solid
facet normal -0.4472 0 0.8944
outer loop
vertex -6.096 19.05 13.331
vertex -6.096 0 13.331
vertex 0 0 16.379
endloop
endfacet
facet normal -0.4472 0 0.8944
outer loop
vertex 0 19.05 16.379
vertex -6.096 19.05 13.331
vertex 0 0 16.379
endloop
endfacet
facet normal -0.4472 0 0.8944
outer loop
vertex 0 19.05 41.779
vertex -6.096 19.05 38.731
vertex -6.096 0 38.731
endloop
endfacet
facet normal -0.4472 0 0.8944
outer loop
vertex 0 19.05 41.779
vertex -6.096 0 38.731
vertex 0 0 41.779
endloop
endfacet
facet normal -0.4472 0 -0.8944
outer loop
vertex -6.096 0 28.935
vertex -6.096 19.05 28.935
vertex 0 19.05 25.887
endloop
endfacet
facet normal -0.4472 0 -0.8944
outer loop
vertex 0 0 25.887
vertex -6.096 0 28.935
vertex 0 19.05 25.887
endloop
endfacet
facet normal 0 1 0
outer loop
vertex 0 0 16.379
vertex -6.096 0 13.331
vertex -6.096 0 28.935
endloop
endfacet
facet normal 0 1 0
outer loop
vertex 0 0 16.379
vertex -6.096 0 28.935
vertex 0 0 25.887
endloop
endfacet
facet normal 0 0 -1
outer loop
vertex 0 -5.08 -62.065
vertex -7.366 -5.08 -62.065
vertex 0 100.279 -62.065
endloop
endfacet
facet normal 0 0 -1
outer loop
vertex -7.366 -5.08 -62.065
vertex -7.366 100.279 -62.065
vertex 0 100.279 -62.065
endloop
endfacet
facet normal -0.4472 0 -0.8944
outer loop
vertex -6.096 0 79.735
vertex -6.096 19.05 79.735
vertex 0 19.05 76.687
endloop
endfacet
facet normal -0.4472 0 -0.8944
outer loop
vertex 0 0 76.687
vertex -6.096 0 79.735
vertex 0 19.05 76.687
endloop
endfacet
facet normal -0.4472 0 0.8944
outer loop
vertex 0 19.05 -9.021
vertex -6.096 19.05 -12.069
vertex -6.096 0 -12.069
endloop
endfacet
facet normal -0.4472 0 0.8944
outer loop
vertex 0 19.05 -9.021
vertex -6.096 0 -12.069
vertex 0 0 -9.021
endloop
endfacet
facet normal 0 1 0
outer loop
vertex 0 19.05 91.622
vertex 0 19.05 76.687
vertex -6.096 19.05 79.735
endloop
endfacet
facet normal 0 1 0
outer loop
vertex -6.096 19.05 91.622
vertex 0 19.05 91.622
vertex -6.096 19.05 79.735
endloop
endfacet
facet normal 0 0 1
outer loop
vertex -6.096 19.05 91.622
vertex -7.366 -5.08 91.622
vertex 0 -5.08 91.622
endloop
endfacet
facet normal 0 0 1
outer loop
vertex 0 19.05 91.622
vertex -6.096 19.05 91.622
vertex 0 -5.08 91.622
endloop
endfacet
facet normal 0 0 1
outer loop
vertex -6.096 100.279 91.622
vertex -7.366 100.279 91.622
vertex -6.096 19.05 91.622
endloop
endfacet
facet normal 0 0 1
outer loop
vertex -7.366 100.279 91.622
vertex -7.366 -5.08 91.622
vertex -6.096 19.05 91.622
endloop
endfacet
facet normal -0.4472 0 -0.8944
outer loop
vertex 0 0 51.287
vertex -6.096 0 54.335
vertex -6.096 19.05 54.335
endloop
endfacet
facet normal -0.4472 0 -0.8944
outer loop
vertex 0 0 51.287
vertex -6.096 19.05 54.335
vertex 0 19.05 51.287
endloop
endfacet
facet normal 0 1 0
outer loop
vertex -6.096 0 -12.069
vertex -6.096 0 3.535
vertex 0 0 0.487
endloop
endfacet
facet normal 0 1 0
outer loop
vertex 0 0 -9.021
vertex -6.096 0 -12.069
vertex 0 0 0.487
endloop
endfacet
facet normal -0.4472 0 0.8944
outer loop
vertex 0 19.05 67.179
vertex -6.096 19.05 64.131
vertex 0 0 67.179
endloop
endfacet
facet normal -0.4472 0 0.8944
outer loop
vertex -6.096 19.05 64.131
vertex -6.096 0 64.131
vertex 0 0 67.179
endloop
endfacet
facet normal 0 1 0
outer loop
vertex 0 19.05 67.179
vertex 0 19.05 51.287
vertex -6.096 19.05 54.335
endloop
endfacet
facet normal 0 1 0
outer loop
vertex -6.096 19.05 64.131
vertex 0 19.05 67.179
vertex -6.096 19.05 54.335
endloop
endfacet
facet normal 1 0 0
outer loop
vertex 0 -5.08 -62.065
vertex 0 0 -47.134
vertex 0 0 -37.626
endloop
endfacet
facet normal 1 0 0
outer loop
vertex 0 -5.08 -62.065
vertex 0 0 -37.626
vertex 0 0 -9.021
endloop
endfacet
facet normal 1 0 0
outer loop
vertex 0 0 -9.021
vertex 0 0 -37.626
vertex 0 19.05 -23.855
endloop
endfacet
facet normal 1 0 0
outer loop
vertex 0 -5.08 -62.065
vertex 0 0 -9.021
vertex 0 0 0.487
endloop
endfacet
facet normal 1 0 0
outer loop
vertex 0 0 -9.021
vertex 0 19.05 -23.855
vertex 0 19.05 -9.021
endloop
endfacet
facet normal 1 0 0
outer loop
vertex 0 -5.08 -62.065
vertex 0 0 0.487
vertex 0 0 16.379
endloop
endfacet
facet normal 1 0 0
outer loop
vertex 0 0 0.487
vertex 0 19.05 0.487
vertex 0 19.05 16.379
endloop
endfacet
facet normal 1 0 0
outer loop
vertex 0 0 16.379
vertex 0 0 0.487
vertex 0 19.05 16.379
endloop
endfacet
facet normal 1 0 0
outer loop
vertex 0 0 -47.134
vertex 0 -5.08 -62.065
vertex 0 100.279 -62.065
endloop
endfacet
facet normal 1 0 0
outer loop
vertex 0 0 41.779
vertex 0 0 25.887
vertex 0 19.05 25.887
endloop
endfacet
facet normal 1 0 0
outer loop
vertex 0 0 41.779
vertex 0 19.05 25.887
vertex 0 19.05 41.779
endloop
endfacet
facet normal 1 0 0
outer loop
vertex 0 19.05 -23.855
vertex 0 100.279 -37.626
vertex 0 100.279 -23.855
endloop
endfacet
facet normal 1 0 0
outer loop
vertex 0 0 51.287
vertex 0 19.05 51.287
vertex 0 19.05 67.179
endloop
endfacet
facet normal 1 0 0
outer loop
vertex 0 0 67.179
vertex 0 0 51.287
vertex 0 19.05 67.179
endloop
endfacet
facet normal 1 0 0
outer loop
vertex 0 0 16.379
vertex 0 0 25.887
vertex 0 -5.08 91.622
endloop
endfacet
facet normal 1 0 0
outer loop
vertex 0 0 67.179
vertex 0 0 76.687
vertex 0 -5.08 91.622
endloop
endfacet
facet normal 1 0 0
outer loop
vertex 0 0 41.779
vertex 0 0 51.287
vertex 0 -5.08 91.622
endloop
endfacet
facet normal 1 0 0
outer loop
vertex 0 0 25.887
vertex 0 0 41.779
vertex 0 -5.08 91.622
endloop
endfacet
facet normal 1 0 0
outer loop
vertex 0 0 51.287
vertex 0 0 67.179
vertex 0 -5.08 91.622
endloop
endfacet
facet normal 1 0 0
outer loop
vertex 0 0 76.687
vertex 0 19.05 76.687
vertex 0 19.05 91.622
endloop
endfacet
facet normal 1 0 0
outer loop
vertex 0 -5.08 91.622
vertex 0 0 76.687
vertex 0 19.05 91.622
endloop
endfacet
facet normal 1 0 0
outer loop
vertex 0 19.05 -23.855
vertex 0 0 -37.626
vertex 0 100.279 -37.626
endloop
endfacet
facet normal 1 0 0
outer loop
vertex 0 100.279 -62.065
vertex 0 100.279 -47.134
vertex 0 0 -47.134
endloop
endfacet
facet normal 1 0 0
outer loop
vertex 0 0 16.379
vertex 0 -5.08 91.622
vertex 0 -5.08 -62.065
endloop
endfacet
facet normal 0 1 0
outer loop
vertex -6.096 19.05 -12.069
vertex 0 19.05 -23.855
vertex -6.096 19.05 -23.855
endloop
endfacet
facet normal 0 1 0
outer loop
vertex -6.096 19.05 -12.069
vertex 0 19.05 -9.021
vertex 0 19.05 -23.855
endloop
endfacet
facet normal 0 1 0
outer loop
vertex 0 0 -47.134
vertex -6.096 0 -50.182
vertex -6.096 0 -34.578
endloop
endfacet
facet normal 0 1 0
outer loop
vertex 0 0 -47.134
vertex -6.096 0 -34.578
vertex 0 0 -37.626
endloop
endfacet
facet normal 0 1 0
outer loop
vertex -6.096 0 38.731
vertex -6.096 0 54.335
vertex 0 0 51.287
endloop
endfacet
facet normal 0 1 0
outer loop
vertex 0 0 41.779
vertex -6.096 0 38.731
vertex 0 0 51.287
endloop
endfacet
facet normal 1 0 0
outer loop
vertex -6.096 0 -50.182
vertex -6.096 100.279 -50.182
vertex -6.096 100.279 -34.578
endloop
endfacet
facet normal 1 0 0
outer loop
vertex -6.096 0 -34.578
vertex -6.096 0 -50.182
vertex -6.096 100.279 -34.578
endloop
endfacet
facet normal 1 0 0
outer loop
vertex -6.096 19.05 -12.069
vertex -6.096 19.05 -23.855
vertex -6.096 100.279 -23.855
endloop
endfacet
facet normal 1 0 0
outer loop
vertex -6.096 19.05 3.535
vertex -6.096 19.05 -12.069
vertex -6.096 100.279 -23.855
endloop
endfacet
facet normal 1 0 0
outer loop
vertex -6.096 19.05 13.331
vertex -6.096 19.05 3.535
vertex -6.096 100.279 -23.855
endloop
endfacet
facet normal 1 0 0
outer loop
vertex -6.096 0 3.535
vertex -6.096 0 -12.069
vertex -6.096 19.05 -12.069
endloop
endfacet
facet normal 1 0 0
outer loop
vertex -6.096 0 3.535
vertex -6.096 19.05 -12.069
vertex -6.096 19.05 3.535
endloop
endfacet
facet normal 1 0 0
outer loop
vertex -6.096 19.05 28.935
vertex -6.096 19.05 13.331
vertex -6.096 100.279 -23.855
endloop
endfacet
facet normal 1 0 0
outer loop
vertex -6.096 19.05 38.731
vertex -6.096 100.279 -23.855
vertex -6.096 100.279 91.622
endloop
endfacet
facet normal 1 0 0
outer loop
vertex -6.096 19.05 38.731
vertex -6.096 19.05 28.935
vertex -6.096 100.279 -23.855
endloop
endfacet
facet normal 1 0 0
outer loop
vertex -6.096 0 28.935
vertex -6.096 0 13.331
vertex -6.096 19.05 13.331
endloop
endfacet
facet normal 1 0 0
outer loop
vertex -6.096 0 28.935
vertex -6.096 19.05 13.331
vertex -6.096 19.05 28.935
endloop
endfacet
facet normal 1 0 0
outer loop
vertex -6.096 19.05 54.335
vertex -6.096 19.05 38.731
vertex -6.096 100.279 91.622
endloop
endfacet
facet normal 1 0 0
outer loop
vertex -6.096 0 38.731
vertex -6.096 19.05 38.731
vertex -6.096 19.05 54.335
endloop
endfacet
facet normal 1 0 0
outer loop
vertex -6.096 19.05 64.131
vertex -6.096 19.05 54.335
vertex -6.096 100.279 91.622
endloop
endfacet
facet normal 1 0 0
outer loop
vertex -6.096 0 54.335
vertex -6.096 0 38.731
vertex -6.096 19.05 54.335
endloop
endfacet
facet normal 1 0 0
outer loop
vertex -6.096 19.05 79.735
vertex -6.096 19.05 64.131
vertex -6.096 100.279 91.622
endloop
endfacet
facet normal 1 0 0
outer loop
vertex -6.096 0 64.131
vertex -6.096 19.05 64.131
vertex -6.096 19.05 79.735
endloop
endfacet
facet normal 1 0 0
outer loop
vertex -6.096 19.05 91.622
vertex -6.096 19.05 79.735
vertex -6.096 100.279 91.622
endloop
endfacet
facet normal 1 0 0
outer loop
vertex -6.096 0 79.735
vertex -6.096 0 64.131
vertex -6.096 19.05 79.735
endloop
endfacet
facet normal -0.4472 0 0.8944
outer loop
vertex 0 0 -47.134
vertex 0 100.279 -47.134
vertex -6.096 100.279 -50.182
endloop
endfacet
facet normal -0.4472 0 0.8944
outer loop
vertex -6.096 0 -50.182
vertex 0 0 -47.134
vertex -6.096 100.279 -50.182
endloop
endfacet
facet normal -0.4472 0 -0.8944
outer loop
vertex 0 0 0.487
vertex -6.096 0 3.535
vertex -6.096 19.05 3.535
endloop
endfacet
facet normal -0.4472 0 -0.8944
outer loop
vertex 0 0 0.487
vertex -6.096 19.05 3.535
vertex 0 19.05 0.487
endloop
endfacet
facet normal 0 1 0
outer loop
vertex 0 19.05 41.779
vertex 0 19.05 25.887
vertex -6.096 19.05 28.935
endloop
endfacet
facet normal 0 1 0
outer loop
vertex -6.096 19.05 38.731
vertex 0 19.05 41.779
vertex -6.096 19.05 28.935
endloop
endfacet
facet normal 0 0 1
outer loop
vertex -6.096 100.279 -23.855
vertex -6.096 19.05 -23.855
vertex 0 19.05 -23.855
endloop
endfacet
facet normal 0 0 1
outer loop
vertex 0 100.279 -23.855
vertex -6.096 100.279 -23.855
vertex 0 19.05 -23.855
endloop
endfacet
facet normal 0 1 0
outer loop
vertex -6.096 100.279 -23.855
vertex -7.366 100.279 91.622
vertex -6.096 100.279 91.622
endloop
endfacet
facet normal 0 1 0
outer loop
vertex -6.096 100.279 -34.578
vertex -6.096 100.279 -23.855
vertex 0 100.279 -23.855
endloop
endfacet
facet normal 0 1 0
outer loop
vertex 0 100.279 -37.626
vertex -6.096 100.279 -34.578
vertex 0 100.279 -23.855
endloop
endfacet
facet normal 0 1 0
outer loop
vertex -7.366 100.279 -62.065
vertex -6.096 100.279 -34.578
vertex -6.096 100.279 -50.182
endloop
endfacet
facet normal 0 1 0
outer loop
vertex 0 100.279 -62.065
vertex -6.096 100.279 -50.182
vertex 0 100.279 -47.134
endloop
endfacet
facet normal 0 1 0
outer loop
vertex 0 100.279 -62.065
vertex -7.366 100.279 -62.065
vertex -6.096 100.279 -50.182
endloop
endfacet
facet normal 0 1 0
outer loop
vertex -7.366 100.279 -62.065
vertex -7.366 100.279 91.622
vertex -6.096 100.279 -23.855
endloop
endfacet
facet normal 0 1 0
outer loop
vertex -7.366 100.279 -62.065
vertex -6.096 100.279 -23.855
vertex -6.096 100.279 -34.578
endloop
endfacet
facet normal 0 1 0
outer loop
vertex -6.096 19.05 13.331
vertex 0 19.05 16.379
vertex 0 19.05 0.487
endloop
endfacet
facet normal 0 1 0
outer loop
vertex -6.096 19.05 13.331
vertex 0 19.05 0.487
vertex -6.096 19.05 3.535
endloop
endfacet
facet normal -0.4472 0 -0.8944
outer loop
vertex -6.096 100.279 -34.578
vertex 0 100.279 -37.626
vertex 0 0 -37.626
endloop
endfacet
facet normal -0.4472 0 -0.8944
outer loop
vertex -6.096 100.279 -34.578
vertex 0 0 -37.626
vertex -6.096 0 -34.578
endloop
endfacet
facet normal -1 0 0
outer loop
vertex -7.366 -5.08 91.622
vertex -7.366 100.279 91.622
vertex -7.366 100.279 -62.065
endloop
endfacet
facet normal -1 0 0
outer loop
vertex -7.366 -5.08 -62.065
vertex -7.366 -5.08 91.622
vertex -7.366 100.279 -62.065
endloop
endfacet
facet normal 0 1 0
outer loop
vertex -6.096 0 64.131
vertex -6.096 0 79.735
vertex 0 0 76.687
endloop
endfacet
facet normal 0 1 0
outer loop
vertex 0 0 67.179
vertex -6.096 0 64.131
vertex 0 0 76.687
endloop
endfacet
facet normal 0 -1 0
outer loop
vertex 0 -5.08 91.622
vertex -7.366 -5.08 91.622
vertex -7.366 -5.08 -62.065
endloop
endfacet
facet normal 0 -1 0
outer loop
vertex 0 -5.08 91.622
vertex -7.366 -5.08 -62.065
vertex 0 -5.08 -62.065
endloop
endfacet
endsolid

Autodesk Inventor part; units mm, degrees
ref_plane "YZ Plane" through (0, 0, 0) normal (1, 0, 0) x (0, 1, 0)
ref_plane "XZ Plane" through (0, 0, 0) normal (0, 1, 0) x (-1, 0, 0)
ref_plane "XY Plane" through (0, 0, 0) normal (0, 0, 1) x (1, 0, 0)
sketch "Sketch1" plane through (0, 0, 0) normal (0, 1, 0) x (-1, 0, 0)
  line L0 (7.366, 6.1452) -> (7.366, -23.8548)
  line L1 (7.366, -23.8548) -> (0, -23.8548)
  line L2 (6.096, -8.0476) -> (6.096, -9.0212)
  line L3 (0, 0.4868) -> (0, 3.5348)
  line L4 (6.096, 3.5348) -> (6.096, -8.0476)
  line L5 (0, -9.0212) -> (0, -11.8152)
  line L6 (6.096, -12.0692) -> (6.096, -9.0212)
  line L7 (6.096, 3.5348) -> (0, 0.4868)
  line L8 (6.096, -12.0692) -> (0, -9.0212)
  line L9 (0, -23.8548) -> (0, -9.0212)
  line L10 (0, 0.4868) -> (0, 16.3788)
  line L11 (6.096, 13.3308) -> (6.096, 16.3788)
  line L12 (6.096, 13.3308) -> (0, 16.3788)
  line L13 (6.096, 28.9348) -> (6.096, 17.3524)
  line L14 (6.096, 28.9348) -> (0, 25.8868)
  line L15 (6.096, 17.3524) -> (6.096, 16.3788)
  line L16 (6.096, 38.7308) -> (6.096, 41.7788)
  line L17 (6.096, 38.7308) -> (0, 41.7788)
  line L18 (6.096, 54.3348) -> (6.096, 42.7524)
  line L19 (6.096, 54.3348) -> (0, 51.2868)
  line L20 (6.096, 42.7524) -> (6.096, 41.7788)
  line L21 (6.096, 64.1308) -> (6.096, 67.1788)
  line L22 (6.096, 64.1308) -> (0, 67.1788)
  line L23 (6.096, 79.7348) -> (6.096, 68.1524)
  line L24 (6.096, 79.7348) -> (0, 76.6868)
  line L25 (6.096, 68.1524) -> (6.096, 67.1788)
  line L26 (7.366, 6.1452) -> (7.366, 91.622)
  line L27 (7.366, 91.622) -> (0, 91.622)
  line L28 (0, 25.8868) -> (0, 41.7788)
  line L29 (0, 51.2868) -> (0, 67.1788)
  line L30 (0, 76.6868) -> (0, 91.622)
  line L31 (6.096, -4.2672) -> (4.0009, -4.2672) construction
  point P0 (0, 0)
  dimension "d0" = 7.366
  dimension "d8" = 9.508
  dimension "d10" = 3.048
  dimension "d11" = 3.048
  dimension "d12" = 6.096
  dimension "d17" = 25.4
  dimension "d24" = 11.7856
  dimension "d67" = 115.4768
  dimension "d70" = 23.8548
  dimension "d71" = 4.754
extrude "MultipleTeeth" add sketch "Sketch1" along normal blind 19.05
sketch "Sketch2" plane through (0, 0, 0) normal (0, -1, 0) x (1, 0, 0)
  line L0 (0, 0.4868) -> (-6.096, 3.5348) construction
  line L1 (-6.096, 3.5348) -> (-6.096, -12.0692) construction
  line L2 (-6.096, -12.0692) -> (0, -9.0212) construction
  line L3 (0, 16.3788) -> (0, 0.4868) projected
  line L4 (0, 0.4868) -> (-6.096, 3.5348)
  line L5 (-6.096, -12.0692) -> (0, -9.0212) projected
  line L6 (-6.096, 3.5348) -> (-6.096, -12.0692) projected
  line L7 (-6.096, -12.0692) -> (-6.096, 3.5348)
  line L8 (0, -9.0212) -> (-6.096, -12.0692)
  line L9 (-7.366, -23.8548) -> (-7.366, 91.622) projected
  line L10 (-7.366, -59.508) -> (-7.366, -32.8548)
  line L11 (-7.366, -23.8548) -> (0, -23.8548)
  line L12 (-7.366, 91.622) -> (0, 91.622) projected
  line L13 (-7.366, -55.8503) -> (-7.366, -40.458) construction
  line L14 (0, -43.0234) -> (0, -59.508) construction
  line L15 (-6.096, -62.0648) -> (0, -62.0648) construction
  line L16 (0, -32.8548) -> (0, -37.6258)
  line L17 (0, -49.9828) -> (0, -62.0648)
  line L18 (0, -62.0648) -> (0, -59.508)
  line L19 (0, -32.8548) -> (-7.366, -32.8548) construction
  line L20 (0, -51.9048) -> (-7.366, -51.9048) construction
  line L21 (0, -42.3798) -> (-7.366, -42.3798) construction
  line L22 (-6.096, -12.0692) -> (-6.096, -62.0648) construction
  line L23 (0, -37.6258) -> (-6.096, -34.5778)
  line L24 (-6.096, -50.1818) -> (-6.096, -34.5778)
  line L25 (0, -47.1338) -> (-6.096, -50.1818)
  line L26 (0, -9.0212) -> (0, -23.8548) projected
  line L27 (0, -23.8548) -> (0, -32.8548)
  line L28 (-7.366, -32.8548) -> (-7.366, -23.8548)
  line L29 (0, -49.9828) -> (0, -47.1338)
  line L30 (0, -62.0648) -> (-7.366, -62.0648)
  line L31 (-7.366, -62.0648) -> (-7.366, -59.508)
  point P0 (0, 0)
  dimension "d25" = 115.4768
  dimension "d33" = 9
  dimension "d34" = 19.05
  dimension "d36" = 9.525
  dimension "d38" = 10.16
extrude "LongTooth" add sketch "Sketch2" against normal blind 100.2792
sketch "Sketch3" plane through (0, 19.05, 0) normal (0, 1, 0) x (1, 0, 0)
  line L0 (-6.096, -3.5348) -> (-6.096, 12.0692) construction
  line L1 (0, 23.8548) -> (-7.366, 23.8548) projected
  line L2 (-7.366, -91.622) -> (0, -91.622) projected
  line L3 (-7.366, 23.8548) -> (-6.096, 23.8548)
  line L4 (-6.096, 23.8548) -> (-6.096, -91.622)
  line L5 (-6.096, -91.622) -> (-7.366, -91.622)
  line L6 (-7.366, -91.622) -> (-7.366, 23.8548)
  point P0 (0, 0)
extrude "ThinPlate" add sketch "Sketch3" along normal up to surface (81.2292 mm away)
sketch "Sketch4" plane through (0, 0, 0) normal (0, -1, 0) x (1, 0, 0)
  line L0 (-6.096, 91.622) -> (0, 91.622) projected
  line L1 (-7.366, 91.622) -> (-7.366, -62.0648) projected
  line L2 (0, 91.622) -> (-7.366, 91.622)
  line L3 (-7.366, 91.622) -> (-7.366, -62.0648)
  line L4 (-7.366, -62.0648) -> (0, -62.0648)
  line L5 (0, -62.0648) -> (0, 91.622)
  point P0 (0, 0)
extrude "Extrusion4" add sketch "Sketch4" along normal blind 5.08
ref_plane "Work Plane1" through (-15.892, 0, 8.4328) normal (0, 0, 1) x (0, 1, 0)
sketch "Sketch6" plane through (0, 19.05, 16.3788) normal (1, 0, 0) x (0, 0, -1)
  circle A0 centre (71.4586, -8.89) radius 1.9304
  line L0 (78.4436, 81.2292) -> (78.4436, -24.13) projected
  line L1 (78.4436, -24.13) -> (-75.2432, -24.13) projected
  circle A1 centre (58.7586, -8.89) radius 1.9304
  circle A2 centre (46.0586, -8.89) radius 1.9304
  circle A3 centre (71.4586, 3.81) radius 1.9304
  circle A4 centre (58.7586, 3.81) radius 1.9304
  circle A5 centre (46.0586, 3.81) radius 1.9304
  circle A6 centre (71.4586, 16.51) radius 1.9304
  circle A7 centre (58.7586, 16.51) radius 1.9304
  circle A8 centre (46.0586, 16.51) radius 1.9304
  circle A9 centre (71.4586, 29.21) radius 1.9304
  circle A10 centre (58.7586, 29.21) radius 1.9304
  circle A11 centre (46.0586, 29.21) radius 1.9304
  circle A12 centre (71.4586, 41.91) radius 1.9304
  circle A13 centre (58.7586, 41.91) radius 1.9304
  circle A14 centre (46.0586, 41.91) radius 1.9304
  circle A15 centre (71.4586, 54.61) radius 1.9304
  circle A16 centre (58.7586, 54.61) radius 1.9304
  circle A17 centre (46.0586, 54.61) radius 1.9304
  circle A18 centre (71.4586, 67.31) radius 1.9304
  circle A19 centre (58.7586, 67.31) radius 1.9304
  circle A20 centre (46.0586, 67.31) radius 1.9304
  circle A21 centre (71.4586, 80.01) radius 1.9304
  circle A22 centre (58.7586, 80.01) radius 1.9304
  circle A23 centre (46.0586, 80.01) radius 1.9304
  circle A24 centre (33.3586, -8.89) radius 1.9304
  circle A25 centre (33.3586, 3.81) radius 1.9304
  circle A26 centre (33.3586, 16.51) radius 1.9304
  circle A27 centre (33.3586, 29.21) radius 1.9304
  circle A28 centre (33.3586, 41.91) radius 1.9304
  circle A29 centre (33.3586, 54.61) radius 1.9304
  circle A30 centre (33.3586, 67.31) radius 1.9304
  circle A31 centre (33.3586, 80.01) radius 1.9304
  circle A32 centre (20.6586, -8.89) radius 1.9304
  circle A33 centre (20.6586, 3.81) radius 1.9304
  circle A34 centre (20.6586, 16.51) radius 1.9304
  circle A35 centre (20.6586, 29.21) radius 1.9304
  circle A36 centre (20.6586, 41.91) radius 1.9304
  circle A37 centre (20.6586, 54.61) radius 1.9304
  circle A38 centre (20.6586, 67.31) radius 1.9304
  circle A39 centre (20.6586, 80.01) radius 1.9304
  circle A40 centre (7.9586, -8.89) radius 1.9304
  circle A41 centre (7.9586, 3.81) radius 1.9304
  circle A42 centre (7.9586, 16.51) radius 1.9304
  circle A43 centre (7.9586, 29.21) radius 1.9304
  circle A44 centre (7.9586, 41.91) radius 1.9304
  circle A45 centre (7.9586, 54.61) radius 1.9304
  circle A46 centre (7.9586, 67.31) radius 1.9304
  circle A47 centre (7.9586, 80.01) radius 1.9304
  circle A48 centre (-4.7414, -8.89) radius 1.9304
  circle A49 centre (-4.7414, 3.81) radius 1.9304
  circle A50 centre (-4.7414, 16.51) radius 1.9304
  circle A51 centre (-4.7414, 29.21) radius 1.9304
  circle A52 centre (-4.7414, 41.91) radius 1.9304
  circle A53 centre (-4.7414, 54.61) radius 1.9304
  circle A54 centre (-4.7414, 67.31) radius 1.9304
  circle A55 centre (-4.7414, 80.01) radius 1.9304
  circle A56 centre (-17.4414, -8.89) radius 1.9304
  circle A57 centre (-17.4414, 3.81) radius 1.9304
  circle A58 centre (-17.4414, 16.51) radius 1.9304
  circle A59 centre (-17.4414, 29.21) radius 1.9304
  circle A60 centre (-17.4414, 41.91) radius 1.9304
  circle A61 centre (-17.4414, 54.61) radius 1.9304
  circle A62 centre (-17.4414, 67.31) radius 1.9304
  circle A63 centre (-17.4414, 80.01) radius 1.9304
  circle A64 centre (-30.1414, -8.89) radius 1.9304
  circle A65 centre (-30.1414, 3.81) radius 1.9304
  circle A66 centre (-30.1414, 16.51) radius 1.9304
  circle A67 centre (-30.1414, 29.21) radius 1.9304
  circle A68 centre (-30.1414, 41.91) radius 1.9304
  circle A69 centre (-30.1414, 54.61) radius 1.9304
  circle A70 centre (-30.1414, 67.31) radius 1.9304
  circle A71 centre (-30.1414, 80.01) radius 1.9304
  circle A72 centre (-42.8414, -8.89) radius 1.9304
  circle A73 centre (-42.8414, 3.81) radius 1.9304
  circle A74 centre (-42.8414, 16.51) radius 1.9304
  circle A75 centre (-42.8414, 29.21) radius 1.9304
  circle A76 centre (-42.8414, 41.91) radius 1.9304
  circle A77 centre (-42.8414, 54.61) radius 1.9304
  circle A78 centre (-42.8414, 67.31) radius 1.9304
  circle A79 centre (-42.8414, 80.01) radius 1.9304
  circle A80 centre (-55.5414, -8.89) radius 1.9304
  circle A81 centre (-55.5414, 3.81) radius 1.9304
  circle A82 centre (-55.5414, 16.51) radius 1.9304
  circle A83 centre (-55.5414, 29.21) radius 1.9304
  circle A84 centre (-55.5414, 41.91) radius 1.9304
  circle A85 centre (-55.5414, 54.61) radius 1.9304
  circle A86 centre (-55.5414, 67.31) radius 1.9304
  circle A87 centre (-55.5414, 80.01) radius 1.9304
  circle A88 centre (-68.2414, -8.89) radius 1.9304
  circle A89 centre (-68.2414, 3.81) radius 1.9304
  circle A90 centre (-68.2414, 16.51) radius 1.9304
  circle A91 centre (-68.2414, 29.21) radius 1.9304
  circle A92 centre (-68.2414, 41.91) radius 1.9304
  circle A93 centre (-68.2414, 54.61) radius 1.9304
  circle A94 centre (-68.2414, 67.31) radius 1.9304
  circle A95 centre (-68.2414, 80.01) radius 1.9304
  circle A96 centre (-80.9414, -8.89) radius 1.9304
  circle A97 centre (-80.9414, 3.81) radius 1.9304
  circle A98 centre (-80.9414, 16.51) radius 1.9304
  circle A99 centre (-80.9414, 29.21) radius 1.9304
  circle A100 centre (-80.9414, 41.91) radius 1.9304
  circle A101 centre (-80.9414, 54.61) radius 1.9304
  circle A102 centre (-80.9414, 67.31) radius 1.9304
  circle A103 centre (-80.9414, 80.01) radius 1.9304
  point P0 (16.3788, -19.05)
  dimension "d56" = 3.8608
  dimension "d57" = 6.985
  dimension "d58" = 15.24
  dimension "d61" = 12.7
  dimension "d64" = 12.7
equation "\"d11\" = d10"
equation "\"d71\" = 0.5 * d8"
equation "\"d36\" = 0.5 * d34"
properties part number "Lift receiver left side actobtics"
